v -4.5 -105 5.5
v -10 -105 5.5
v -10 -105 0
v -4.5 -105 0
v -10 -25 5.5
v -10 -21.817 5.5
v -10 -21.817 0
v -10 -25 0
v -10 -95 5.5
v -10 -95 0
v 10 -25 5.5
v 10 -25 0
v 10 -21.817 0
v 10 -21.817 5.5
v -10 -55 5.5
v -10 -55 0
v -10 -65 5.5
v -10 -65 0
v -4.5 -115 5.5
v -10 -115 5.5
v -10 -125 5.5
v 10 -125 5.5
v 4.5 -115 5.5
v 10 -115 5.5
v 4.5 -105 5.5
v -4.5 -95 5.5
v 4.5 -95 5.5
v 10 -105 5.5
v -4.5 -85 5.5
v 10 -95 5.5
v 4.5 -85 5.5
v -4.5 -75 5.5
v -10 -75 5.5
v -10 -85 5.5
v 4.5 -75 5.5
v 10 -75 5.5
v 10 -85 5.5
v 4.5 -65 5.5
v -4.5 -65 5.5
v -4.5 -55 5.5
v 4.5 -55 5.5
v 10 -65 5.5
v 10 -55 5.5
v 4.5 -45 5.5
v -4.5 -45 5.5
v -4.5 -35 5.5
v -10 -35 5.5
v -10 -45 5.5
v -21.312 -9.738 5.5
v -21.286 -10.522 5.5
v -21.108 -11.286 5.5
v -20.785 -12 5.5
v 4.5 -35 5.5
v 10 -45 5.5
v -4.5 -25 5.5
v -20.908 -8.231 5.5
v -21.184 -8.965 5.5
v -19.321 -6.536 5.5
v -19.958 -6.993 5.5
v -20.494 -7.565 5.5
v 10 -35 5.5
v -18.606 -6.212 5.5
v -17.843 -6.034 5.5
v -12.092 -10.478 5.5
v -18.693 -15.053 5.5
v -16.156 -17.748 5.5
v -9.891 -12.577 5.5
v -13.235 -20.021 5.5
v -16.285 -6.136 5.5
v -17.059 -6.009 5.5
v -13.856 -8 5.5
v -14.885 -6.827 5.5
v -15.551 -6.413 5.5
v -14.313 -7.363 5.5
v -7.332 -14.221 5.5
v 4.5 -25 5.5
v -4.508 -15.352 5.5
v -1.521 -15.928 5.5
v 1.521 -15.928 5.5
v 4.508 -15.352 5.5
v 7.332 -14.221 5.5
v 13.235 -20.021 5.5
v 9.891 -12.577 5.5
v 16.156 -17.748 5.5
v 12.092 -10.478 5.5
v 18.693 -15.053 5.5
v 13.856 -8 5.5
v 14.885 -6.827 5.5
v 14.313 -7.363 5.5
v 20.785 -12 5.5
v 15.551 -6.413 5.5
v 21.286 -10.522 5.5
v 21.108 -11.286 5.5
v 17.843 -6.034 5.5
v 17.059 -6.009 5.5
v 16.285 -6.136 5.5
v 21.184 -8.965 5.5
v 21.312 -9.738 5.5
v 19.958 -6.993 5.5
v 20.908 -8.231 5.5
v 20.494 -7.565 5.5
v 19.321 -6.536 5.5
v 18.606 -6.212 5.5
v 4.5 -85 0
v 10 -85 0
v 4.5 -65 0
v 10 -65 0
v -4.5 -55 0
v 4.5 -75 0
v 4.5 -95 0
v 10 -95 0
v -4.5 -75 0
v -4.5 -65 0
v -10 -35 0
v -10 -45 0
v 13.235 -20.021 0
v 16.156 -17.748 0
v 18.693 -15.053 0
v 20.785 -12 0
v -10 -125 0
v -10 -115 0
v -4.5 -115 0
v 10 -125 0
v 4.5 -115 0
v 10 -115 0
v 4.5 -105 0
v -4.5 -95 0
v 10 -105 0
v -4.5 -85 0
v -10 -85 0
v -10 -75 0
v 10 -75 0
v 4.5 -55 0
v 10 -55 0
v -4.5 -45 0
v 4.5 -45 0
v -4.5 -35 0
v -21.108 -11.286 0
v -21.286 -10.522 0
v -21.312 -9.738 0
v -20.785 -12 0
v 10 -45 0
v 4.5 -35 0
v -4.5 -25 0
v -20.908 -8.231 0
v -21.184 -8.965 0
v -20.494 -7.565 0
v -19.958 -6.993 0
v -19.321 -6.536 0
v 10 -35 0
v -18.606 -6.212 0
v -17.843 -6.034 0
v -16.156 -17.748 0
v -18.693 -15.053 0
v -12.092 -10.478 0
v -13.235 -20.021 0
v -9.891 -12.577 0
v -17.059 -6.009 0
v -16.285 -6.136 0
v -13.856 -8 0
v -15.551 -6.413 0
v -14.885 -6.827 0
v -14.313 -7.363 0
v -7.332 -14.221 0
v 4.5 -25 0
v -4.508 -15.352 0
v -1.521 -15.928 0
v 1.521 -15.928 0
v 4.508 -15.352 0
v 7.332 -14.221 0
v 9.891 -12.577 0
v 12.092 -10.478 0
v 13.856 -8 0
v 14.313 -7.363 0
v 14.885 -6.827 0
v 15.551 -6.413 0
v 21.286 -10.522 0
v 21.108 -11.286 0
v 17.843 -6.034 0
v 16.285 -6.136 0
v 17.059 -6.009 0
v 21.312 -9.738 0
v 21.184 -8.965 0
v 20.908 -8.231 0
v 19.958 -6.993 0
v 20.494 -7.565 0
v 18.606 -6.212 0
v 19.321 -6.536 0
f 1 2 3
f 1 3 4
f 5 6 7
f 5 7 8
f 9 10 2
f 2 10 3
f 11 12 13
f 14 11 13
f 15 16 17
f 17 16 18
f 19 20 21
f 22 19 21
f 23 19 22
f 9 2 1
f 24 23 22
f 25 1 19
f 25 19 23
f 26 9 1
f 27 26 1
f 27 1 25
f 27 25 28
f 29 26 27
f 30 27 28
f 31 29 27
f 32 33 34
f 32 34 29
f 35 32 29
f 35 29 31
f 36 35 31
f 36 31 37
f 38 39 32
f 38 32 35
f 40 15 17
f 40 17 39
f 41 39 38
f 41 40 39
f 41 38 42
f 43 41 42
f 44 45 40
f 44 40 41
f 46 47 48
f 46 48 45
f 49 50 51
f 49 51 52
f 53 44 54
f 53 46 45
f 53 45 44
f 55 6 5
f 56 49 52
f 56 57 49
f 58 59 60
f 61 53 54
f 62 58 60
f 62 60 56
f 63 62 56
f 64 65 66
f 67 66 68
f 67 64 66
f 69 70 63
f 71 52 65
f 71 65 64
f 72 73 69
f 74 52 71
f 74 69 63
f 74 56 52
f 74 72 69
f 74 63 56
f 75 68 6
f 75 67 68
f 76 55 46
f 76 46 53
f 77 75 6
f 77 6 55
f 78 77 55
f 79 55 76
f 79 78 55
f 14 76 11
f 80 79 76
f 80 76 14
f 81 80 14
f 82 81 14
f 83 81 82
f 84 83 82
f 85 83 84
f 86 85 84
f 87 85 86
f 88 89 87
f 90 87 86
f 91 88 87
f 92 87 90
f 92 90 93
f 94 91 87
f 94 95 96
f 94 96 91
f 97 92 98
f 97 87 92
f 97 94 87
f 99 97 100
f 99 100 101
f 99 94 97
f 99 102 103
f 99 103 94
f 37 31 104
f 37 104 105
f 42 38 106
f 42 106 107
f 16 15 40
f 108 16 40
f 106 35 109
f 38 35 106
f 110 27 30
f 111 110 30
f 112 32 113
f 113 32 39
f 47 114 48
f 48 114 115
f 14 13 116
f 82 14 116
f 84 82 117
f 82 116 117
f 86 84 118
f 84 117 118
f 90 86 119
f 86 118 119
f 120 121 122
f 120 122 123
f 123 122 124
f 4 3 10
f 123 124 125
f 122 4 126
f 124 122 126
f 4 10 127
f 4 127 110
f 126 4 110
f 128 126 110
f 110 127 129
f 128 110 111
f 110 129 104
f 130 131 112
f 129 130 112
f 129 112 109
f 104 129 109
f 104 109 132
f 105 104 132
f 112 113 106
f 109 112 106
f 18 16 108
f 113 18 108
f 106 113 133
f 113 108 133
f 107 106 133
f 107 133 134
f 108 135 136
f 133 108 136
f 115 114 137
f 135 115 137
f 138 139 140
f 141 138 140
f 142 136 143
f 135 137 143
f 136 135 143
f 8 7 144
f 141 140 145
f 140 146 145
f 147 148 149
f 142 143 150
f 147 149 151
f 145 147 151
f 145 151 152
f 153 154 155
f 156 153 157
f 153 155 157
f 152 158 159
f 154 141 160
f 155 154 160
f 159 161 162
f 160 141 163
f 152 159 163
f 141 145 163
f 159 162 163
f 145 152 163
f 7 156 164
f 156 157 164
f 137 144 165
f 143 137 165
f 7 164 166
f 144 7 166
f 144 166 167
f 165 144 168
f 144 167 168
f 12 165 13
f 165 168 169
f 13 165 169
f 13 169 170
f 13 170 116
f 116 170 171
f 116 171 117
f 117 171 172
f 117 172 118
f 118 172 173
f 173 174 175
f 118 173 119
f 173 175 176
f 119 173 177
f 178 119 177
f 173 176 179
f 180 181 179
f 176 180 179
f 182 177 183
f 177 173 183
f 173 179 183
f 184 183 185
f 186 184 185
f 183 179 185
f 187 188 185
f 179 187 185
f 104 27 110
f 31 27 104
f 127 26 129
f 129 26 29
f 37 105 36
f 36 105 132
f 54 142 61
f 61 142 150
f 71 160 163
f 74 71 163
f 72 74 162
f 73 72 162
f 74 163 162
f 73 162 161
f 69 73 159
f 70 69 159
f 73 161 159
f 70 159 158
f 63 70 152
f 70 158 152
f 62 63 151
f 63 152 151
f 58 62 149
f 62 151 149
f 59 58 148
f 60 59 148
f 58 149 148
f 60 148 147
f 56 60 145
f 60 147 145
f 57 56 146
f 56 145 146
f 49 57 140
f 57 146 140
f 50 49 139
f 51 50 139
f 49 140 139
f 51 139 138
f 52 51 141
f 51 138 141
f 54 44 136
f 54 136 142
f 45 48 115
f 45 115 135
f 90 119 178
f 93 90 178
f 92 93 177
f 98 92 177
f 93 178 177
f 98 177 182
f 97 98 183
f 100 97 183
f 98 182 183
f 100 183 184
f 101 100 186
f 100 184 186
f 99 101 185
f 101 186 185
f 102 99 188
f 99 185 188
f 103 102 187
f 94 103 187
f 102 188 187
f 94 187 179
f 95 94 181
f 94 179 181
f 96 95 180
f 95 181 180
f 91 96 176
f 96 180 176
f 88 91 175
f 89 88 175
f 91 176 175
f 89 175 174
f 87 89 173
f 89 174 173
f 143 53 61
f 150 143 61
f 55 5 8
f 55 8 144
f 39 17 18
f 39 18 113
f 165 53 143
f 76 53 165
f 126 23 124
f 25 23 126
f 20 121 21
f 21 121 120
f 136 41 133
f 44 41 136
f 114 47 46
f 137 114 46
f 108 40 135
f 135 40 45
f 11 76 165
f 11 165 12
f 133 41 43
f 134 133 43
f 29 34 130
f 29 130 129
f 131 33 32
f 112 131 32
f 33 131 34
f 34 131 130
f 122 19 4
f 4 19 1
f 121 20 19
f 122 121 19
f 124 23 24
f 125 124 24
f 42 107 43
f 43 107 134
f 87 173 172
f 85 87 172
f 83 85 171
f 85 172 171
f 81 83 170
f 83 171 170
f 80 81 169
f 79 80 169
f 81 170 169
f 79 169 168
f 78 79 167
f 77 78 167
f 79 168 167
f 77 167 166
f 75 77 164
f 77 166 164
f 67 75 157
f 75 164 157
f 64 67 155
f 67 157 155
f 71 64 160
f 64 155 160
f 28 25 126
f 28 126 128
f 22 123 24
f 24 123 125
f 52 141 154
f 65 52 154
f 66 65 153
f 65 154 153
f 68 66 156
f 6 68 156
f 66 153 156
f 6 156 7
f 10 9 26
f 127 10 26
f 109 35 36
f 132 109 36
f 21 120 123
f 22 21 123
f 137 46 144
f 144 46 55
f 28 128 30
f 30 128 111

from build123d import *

# Parameters (mm, degrees)
EXTRUDE_1_DEPTH     = 5.5
SKETCH_2_W          = 5.5
SKETCH_2_H          = 10
CUT_EXTRUDE_1_DEPTH = 127.924442345


with BuildPart() as part:
    # ｽｹｯﾁ1 → ﾎﾞｽ - 押し出し1 (new body)
    with BuildSketch(Plane.XY):
        with BuildLine():
            Line((-10, -21.817424229), (-10, -125))
            Line((-10, -125), (10, -125))
            Line((10, -125), (10, -21.817424229))
            ThreePointArc((10, -21.817424229), (16.156067067, -17.747718076), (20.784609691, -12))
            ThreePointArc((20.784609691, -12), (19.320508076, -6.535898385), (13.856406461, -8))
            ThreePointArc((13.856406461, -8), (0, -16), (-13.856406461, -8))
            ThreePointArc((-13.856406461, -8), (-19.320508076, -6.535898385), (-20.784609691, -12))
            ThreePointArc((-20.784609691, -12), (-16.156067067, -17.747718076), (-10, -21.817424229))
        make_face()
    extrude(amount=EXTRUDE_1_DEPTH)

    # ｽｹｯﾁ2 → ｶｯﾄ - 押し出し1 (cut, through all)
    with BuildSketch(Plane.XY.offset(5.5)):
        with Locations((-7.25, -90)):
            Rectangle(SKETCH_2_W, SKETCH_2_H)
        with Locations((-7.25, -110)):
            Rectangle(SKETCH_2_W, SKETCH_2_H)
        with Locations((-7.25, -70)):
            Rectangle(SKETCH_2_W, SKETCH_2_H)
        with Locations((-7.25, -50)):
            Rectangle(SKETCH_2_W, SKETCH_2_H)
        with Locations((-7.25, -30)):
            Rectangle(SKETCH_2_W, SKETCH_2_H)
        with Locations((7.25, -110)):
            Rectangle(SKETCH_2_W, SKETCH_2_H)
        with Locations((7.25, -90)):
            Rectangle(SKETCH_2_W, SKETCH_2_H)
        with Locations((7.25, -70)):
            Rectangle(SKETCH_2_W, SKETCH_2_H)
        with Locations((7.25, -50)):
            Rectangle(SKETCH_2_W, SKETCH_2_H)
        with Locations((7.25, -30)):
            Rectangle(SKETCH_2_W, SKETCH_2_H)
    extrude(amount=-CUT_EXTRUDE_1_DEPTH, mode=Mode.SUBTRACT)


solid = part.part
